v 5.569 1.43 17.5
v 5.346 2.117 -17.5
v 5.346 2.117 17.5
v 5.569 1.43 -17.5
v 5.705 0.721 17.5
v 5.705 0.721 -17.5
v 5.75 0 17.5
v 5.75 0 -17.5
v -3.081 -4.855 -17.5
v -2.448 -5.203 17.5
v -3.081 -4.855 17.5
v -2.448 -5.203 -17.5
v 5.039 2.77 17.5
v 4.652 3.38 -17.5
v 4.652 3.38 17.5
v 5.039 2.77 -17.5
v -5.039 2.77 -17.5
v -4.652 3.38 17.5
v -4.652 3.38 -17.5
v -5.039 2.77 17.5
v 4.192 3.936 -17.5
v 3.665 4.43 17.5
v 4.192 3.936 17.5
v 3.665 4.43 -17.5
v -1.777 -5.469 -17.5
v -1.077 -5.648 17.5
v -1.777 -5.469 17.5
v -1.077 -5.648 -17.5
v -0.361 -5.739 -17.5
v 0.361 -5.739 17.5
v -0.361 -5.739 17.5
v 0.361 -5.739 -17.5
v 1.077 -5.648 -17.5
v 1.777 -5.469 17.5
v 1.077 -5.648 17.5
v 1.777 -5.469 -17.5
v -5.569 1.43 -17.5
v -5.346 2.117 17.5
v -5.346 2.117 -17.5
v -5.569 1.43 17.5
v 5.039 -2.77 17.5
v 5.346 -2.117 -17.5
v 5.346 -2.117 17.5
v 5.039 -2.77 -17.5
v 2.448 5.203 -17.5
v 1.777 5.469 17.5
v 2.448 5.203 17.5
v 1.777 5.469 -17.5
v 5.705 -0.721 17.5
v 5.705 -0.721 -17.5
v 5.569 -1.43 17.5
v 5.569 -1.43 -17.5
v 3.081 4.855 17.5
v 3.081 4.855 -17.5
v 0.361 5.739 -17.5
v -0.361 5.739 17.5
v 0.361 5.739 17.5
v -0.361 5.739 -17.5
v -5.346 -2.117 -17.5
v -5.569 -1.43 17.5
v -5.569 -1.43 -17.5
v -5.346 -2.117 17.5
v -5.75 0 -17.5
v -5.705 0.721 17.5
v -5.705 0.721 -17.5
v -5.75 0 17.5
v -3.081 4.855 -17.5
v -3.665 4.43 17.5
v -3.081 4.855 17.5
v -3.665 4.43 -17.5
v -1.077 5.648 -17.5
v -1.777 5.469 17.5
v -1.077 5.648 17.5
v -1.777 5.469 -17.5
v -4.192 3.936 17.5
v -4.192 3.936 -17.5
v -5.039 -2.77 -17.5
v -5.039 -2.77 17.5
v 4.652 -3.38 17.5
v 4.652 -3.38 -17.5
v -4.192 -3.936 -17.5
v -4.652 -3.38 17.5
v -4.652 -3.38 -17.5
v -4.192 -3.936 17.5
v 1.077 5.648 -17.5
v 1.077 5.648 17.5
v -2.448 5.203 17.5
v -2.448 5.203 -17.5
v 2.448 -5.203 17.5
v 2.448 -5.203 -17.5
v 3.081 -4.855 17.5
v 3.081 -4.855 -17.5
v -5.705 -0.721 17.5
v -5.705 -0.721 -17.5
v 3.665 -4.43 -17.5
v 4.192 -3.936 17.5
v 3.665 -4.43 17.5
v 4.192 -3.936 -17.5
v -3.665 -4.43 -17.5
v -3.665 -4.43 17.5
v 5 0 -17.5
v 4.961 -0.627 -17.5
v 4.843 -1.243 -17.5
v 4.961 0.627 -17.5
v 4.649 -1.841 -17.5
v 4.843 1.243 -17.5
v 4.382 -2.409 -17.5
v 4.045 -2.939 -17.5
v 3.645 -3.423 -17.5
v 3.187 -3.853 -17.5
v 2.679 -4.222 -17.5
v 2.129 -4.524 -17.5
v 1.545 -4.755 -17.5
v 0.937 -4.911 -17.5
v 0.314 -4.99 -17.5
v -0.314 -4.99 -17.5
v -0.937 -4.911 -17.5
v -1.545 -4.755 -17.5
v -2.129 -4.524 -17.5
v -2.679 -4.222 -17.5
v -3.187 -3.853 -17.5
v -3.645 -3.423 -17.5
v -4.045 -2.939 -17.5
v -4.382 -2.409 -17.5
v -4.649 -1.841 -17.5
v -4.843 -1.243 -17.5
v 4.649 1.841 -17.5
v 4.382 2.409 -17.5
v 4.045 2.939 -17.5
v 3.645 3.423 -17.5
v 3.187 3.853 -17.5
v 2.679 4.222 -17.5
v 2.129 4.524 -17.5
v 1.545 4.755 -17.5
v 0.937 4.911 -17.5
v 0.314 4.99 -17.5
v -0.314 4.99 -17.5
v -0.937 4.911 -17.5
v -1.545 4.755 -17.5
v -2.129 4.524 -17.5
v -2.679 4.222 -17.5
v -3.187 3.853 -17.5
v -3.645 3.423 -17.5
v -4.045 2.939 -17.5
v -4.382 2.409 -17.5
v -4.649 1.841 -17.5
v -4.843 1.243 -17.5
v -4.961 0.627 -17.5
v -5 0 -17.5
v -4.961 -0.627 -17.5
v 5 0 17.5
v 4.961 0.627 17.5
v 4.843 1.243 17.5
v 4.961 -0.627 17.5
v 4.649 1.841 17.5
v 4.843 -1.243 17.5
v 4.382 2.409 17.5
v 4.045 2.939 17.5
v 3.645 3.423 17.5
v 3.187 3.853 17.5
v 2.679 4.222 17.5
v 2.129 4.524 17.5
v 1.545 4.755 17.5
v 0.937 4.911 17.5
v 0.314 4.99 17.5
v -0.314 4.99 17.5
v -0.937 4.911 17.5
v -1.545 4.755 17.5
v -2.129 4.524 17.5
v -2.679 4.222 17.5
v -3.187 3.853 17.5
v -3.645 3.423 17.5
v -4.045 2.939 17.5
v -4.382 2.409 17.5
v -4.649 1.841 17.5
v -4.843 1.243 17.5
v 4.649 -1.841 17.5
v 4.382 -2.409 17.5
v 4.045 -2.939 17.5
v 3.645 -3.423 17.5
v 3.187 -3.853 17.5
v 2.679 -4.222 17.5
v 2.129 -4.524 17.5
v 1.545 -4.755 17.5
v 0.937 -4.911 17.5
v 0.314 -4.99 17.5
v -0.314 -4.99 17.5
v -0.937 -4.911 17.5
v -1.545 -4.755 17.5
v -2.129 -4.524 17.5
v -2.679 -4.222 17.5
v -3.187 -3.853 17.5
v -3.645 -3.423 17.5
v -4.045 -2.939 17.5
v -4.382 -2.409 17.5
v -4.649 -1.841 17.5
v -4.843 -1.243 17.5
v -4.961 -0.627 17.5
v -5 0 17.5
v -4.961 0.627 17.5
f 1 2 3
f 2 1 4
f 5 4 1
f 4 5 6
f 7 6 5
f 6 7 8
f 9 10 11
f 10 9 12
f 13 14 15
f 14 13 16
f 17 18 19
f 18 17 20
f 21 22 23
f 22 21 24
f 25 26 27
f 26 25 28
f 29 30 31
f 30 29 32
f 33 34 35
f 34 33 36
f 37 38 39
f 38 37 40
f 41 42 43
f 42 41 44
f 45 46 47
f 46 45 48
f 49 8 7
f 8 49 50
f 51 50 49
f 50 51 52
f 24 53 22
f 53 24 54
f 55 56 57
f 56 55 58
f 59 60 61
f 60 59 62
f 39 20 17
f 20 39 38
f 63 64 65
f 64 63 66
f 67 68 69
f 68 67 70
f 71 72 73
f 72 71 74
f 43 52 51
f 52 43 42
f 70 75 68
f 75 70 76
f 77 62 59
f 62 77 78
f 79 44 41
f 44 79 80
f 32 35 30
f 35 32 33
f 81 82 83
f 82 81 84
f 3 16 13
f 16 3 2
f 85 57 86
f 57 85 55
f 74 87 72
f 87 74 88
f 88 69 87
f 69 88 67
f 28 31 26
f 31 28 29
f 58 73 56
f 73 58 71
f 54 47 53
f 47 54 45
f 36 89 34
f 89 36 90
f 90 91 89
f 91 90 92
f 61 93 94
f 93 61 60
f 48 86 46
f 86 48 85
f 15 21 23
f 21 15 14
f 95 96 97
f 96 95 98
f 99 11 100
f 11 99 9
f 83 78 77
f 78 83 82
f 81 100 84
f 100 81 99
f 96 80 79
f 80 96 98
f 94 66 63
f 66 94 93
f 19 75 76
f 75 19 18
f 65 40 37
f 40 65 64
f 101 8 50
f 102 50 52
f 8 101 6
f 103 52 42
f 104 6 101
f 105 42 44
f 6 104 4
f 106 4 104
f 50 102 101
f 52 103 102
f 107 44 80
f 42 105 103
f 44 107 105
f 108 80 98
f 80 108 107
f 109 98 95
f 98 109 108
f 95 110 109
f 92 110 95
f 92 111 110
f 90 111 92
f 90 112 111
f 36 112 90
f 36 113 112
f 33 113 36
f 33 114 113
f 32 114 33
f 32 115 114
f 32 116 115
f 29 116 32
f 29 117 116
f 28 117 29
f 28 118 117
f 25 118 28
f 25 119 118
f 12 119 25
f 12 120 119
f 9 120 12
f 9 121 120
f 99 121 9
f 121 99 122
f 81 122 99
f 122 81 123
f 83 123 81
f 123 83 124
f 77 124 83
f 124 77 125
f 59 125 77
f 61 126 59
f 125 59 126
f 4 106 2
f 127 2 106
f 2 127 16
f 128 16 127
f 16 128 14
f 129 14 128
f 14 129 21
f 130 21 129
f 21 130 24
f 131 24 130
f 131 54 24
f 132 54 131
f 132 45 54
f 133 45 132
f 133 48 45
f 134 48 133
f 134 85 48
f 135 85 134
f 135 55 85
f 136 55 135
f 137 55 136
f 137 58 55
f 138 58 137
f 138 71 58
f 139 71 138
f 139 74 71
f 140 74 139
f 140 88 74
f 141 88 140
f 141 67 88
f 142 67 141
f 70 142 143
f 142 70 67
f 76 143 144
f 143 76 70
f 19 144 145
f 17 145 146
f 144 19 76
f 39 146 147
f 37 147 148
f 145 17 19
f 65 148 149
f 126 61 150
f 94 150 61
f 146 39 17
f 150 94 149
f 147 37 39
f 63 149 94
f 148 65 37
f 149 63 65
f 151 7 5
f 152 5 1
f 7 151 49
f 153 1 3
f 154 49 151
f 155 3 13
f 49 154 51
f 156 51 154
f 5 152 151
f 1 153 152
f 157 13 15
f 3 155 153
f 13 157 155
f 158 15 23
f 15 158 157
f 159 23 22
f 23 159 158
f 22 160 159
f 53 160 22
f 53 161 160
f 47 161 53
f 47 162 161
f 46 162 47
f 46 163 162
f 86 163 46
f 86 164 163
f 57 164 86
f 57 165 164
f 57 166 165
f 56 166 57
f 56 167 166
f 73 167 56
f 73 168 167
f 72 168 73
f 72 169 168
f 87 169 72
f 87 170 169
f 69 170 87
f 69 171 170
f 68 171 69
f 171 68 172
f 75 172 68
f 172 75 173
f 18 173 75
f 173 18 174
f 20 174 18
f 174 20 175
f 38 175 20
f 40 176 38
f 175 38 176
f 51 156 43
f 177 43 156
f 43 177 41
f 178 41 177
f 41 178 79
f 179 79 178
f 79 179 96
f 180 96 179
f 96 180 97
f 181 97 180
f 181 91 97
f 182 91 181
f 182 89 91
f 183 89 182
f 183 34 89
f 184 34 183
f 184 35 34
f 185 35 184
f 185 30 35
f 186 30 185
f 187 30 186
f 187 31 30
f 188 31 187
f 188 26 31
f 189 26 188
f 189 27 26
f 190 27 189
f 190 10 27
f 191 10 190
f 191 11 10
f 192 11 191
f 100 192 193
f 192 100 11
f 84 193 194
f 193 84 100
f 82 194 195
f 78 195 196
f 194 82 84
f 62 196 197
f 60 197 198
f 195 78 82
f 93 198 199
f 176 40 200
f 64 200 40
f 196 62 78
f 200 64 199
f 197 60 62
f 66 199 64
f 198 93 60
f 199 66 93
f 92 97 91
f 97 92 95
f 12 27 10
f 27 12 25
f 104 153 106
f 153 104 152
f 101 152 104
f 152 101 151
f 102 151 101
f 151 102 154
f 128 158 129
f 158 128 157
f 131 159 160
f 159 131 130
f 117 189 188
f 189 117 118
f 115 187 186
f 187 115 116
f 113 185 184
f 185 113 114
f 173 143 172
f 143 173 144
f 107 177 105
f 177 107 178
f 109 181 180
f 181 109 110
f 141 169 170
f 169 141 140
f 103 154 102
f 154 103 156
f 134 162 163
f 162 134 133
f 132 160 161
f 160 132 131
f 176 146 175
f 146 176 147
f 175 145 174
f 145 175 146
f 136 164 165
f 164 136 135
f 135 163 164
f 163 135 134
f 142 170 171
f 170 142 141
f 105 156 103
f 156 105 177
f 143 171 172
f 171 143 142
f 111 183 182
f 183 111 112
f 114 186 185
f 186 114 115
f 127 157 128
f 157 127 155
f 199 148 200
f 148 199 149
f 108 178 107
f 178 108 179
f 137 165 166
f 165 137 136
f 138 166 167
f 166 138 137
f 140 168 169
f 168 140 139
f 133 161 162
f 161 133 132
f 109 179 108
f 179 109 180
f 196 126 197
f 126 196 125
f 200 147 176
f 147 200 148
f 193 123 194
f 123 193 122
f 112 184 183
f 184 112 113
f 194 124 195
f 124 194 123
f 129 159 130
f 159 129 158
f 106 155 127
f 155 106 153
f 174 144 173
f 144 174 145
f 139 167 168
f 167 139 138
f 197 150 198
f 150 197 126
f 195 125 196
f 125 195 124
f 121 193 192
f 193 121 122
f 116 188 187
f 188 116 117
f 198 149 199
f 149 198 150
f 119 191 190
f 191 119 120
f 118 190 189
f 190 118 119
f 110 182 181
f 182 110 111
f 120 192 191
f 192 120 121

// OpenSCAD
$fn = 50;


difference() {
	union() {
		translate(v = [0, 0, -17.5000000000]) {
			cylinder(h = 35, r = 5.7500000000);
		}
	}
	union() {
		translate(v = [0, 0, -100.0000000000]) {
			cylinder(h = 200, r = 5.0000000000);
		}
	}
}
